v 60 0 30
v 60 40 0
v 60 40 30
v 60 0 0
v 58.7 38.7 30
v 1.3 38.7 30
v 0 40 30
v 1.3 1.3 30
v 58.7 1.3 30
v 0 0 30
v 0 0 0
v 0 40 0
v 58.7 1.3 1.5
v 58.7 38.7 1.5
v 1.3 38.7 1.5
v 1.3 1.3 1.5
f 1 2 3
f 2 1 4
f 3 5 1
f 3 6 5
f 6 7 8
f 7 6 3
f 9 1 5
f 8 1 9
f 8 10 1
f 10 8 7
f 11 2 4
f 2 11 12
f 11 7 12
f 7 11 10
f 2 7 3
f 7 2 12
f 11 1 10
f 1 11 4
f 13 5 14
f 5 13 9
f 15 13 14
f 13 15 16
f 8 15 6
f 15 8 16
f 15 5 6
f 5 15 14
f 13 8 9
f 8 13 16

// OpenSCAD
$fn = 32;

// ----------------------------------------------------------------------
// Open box: 1.3 mm walls
// ----------------------------------------------------------------------

// --- parameters (mm) ---
box_l = 60;               // outer length, X
box_w = 40;               // outer width, Y
box_h = 30;               // outer height, Z
wall = 1.3;               // wall thickness
floor = 1.5;              // floor thickness

difference() {
  cube([box_l, box_w, box_h]);
  translate([wall, wall, floor])
    cube([box_l - 2 * wall, box_w - 2 * wall, box_h]);
}
